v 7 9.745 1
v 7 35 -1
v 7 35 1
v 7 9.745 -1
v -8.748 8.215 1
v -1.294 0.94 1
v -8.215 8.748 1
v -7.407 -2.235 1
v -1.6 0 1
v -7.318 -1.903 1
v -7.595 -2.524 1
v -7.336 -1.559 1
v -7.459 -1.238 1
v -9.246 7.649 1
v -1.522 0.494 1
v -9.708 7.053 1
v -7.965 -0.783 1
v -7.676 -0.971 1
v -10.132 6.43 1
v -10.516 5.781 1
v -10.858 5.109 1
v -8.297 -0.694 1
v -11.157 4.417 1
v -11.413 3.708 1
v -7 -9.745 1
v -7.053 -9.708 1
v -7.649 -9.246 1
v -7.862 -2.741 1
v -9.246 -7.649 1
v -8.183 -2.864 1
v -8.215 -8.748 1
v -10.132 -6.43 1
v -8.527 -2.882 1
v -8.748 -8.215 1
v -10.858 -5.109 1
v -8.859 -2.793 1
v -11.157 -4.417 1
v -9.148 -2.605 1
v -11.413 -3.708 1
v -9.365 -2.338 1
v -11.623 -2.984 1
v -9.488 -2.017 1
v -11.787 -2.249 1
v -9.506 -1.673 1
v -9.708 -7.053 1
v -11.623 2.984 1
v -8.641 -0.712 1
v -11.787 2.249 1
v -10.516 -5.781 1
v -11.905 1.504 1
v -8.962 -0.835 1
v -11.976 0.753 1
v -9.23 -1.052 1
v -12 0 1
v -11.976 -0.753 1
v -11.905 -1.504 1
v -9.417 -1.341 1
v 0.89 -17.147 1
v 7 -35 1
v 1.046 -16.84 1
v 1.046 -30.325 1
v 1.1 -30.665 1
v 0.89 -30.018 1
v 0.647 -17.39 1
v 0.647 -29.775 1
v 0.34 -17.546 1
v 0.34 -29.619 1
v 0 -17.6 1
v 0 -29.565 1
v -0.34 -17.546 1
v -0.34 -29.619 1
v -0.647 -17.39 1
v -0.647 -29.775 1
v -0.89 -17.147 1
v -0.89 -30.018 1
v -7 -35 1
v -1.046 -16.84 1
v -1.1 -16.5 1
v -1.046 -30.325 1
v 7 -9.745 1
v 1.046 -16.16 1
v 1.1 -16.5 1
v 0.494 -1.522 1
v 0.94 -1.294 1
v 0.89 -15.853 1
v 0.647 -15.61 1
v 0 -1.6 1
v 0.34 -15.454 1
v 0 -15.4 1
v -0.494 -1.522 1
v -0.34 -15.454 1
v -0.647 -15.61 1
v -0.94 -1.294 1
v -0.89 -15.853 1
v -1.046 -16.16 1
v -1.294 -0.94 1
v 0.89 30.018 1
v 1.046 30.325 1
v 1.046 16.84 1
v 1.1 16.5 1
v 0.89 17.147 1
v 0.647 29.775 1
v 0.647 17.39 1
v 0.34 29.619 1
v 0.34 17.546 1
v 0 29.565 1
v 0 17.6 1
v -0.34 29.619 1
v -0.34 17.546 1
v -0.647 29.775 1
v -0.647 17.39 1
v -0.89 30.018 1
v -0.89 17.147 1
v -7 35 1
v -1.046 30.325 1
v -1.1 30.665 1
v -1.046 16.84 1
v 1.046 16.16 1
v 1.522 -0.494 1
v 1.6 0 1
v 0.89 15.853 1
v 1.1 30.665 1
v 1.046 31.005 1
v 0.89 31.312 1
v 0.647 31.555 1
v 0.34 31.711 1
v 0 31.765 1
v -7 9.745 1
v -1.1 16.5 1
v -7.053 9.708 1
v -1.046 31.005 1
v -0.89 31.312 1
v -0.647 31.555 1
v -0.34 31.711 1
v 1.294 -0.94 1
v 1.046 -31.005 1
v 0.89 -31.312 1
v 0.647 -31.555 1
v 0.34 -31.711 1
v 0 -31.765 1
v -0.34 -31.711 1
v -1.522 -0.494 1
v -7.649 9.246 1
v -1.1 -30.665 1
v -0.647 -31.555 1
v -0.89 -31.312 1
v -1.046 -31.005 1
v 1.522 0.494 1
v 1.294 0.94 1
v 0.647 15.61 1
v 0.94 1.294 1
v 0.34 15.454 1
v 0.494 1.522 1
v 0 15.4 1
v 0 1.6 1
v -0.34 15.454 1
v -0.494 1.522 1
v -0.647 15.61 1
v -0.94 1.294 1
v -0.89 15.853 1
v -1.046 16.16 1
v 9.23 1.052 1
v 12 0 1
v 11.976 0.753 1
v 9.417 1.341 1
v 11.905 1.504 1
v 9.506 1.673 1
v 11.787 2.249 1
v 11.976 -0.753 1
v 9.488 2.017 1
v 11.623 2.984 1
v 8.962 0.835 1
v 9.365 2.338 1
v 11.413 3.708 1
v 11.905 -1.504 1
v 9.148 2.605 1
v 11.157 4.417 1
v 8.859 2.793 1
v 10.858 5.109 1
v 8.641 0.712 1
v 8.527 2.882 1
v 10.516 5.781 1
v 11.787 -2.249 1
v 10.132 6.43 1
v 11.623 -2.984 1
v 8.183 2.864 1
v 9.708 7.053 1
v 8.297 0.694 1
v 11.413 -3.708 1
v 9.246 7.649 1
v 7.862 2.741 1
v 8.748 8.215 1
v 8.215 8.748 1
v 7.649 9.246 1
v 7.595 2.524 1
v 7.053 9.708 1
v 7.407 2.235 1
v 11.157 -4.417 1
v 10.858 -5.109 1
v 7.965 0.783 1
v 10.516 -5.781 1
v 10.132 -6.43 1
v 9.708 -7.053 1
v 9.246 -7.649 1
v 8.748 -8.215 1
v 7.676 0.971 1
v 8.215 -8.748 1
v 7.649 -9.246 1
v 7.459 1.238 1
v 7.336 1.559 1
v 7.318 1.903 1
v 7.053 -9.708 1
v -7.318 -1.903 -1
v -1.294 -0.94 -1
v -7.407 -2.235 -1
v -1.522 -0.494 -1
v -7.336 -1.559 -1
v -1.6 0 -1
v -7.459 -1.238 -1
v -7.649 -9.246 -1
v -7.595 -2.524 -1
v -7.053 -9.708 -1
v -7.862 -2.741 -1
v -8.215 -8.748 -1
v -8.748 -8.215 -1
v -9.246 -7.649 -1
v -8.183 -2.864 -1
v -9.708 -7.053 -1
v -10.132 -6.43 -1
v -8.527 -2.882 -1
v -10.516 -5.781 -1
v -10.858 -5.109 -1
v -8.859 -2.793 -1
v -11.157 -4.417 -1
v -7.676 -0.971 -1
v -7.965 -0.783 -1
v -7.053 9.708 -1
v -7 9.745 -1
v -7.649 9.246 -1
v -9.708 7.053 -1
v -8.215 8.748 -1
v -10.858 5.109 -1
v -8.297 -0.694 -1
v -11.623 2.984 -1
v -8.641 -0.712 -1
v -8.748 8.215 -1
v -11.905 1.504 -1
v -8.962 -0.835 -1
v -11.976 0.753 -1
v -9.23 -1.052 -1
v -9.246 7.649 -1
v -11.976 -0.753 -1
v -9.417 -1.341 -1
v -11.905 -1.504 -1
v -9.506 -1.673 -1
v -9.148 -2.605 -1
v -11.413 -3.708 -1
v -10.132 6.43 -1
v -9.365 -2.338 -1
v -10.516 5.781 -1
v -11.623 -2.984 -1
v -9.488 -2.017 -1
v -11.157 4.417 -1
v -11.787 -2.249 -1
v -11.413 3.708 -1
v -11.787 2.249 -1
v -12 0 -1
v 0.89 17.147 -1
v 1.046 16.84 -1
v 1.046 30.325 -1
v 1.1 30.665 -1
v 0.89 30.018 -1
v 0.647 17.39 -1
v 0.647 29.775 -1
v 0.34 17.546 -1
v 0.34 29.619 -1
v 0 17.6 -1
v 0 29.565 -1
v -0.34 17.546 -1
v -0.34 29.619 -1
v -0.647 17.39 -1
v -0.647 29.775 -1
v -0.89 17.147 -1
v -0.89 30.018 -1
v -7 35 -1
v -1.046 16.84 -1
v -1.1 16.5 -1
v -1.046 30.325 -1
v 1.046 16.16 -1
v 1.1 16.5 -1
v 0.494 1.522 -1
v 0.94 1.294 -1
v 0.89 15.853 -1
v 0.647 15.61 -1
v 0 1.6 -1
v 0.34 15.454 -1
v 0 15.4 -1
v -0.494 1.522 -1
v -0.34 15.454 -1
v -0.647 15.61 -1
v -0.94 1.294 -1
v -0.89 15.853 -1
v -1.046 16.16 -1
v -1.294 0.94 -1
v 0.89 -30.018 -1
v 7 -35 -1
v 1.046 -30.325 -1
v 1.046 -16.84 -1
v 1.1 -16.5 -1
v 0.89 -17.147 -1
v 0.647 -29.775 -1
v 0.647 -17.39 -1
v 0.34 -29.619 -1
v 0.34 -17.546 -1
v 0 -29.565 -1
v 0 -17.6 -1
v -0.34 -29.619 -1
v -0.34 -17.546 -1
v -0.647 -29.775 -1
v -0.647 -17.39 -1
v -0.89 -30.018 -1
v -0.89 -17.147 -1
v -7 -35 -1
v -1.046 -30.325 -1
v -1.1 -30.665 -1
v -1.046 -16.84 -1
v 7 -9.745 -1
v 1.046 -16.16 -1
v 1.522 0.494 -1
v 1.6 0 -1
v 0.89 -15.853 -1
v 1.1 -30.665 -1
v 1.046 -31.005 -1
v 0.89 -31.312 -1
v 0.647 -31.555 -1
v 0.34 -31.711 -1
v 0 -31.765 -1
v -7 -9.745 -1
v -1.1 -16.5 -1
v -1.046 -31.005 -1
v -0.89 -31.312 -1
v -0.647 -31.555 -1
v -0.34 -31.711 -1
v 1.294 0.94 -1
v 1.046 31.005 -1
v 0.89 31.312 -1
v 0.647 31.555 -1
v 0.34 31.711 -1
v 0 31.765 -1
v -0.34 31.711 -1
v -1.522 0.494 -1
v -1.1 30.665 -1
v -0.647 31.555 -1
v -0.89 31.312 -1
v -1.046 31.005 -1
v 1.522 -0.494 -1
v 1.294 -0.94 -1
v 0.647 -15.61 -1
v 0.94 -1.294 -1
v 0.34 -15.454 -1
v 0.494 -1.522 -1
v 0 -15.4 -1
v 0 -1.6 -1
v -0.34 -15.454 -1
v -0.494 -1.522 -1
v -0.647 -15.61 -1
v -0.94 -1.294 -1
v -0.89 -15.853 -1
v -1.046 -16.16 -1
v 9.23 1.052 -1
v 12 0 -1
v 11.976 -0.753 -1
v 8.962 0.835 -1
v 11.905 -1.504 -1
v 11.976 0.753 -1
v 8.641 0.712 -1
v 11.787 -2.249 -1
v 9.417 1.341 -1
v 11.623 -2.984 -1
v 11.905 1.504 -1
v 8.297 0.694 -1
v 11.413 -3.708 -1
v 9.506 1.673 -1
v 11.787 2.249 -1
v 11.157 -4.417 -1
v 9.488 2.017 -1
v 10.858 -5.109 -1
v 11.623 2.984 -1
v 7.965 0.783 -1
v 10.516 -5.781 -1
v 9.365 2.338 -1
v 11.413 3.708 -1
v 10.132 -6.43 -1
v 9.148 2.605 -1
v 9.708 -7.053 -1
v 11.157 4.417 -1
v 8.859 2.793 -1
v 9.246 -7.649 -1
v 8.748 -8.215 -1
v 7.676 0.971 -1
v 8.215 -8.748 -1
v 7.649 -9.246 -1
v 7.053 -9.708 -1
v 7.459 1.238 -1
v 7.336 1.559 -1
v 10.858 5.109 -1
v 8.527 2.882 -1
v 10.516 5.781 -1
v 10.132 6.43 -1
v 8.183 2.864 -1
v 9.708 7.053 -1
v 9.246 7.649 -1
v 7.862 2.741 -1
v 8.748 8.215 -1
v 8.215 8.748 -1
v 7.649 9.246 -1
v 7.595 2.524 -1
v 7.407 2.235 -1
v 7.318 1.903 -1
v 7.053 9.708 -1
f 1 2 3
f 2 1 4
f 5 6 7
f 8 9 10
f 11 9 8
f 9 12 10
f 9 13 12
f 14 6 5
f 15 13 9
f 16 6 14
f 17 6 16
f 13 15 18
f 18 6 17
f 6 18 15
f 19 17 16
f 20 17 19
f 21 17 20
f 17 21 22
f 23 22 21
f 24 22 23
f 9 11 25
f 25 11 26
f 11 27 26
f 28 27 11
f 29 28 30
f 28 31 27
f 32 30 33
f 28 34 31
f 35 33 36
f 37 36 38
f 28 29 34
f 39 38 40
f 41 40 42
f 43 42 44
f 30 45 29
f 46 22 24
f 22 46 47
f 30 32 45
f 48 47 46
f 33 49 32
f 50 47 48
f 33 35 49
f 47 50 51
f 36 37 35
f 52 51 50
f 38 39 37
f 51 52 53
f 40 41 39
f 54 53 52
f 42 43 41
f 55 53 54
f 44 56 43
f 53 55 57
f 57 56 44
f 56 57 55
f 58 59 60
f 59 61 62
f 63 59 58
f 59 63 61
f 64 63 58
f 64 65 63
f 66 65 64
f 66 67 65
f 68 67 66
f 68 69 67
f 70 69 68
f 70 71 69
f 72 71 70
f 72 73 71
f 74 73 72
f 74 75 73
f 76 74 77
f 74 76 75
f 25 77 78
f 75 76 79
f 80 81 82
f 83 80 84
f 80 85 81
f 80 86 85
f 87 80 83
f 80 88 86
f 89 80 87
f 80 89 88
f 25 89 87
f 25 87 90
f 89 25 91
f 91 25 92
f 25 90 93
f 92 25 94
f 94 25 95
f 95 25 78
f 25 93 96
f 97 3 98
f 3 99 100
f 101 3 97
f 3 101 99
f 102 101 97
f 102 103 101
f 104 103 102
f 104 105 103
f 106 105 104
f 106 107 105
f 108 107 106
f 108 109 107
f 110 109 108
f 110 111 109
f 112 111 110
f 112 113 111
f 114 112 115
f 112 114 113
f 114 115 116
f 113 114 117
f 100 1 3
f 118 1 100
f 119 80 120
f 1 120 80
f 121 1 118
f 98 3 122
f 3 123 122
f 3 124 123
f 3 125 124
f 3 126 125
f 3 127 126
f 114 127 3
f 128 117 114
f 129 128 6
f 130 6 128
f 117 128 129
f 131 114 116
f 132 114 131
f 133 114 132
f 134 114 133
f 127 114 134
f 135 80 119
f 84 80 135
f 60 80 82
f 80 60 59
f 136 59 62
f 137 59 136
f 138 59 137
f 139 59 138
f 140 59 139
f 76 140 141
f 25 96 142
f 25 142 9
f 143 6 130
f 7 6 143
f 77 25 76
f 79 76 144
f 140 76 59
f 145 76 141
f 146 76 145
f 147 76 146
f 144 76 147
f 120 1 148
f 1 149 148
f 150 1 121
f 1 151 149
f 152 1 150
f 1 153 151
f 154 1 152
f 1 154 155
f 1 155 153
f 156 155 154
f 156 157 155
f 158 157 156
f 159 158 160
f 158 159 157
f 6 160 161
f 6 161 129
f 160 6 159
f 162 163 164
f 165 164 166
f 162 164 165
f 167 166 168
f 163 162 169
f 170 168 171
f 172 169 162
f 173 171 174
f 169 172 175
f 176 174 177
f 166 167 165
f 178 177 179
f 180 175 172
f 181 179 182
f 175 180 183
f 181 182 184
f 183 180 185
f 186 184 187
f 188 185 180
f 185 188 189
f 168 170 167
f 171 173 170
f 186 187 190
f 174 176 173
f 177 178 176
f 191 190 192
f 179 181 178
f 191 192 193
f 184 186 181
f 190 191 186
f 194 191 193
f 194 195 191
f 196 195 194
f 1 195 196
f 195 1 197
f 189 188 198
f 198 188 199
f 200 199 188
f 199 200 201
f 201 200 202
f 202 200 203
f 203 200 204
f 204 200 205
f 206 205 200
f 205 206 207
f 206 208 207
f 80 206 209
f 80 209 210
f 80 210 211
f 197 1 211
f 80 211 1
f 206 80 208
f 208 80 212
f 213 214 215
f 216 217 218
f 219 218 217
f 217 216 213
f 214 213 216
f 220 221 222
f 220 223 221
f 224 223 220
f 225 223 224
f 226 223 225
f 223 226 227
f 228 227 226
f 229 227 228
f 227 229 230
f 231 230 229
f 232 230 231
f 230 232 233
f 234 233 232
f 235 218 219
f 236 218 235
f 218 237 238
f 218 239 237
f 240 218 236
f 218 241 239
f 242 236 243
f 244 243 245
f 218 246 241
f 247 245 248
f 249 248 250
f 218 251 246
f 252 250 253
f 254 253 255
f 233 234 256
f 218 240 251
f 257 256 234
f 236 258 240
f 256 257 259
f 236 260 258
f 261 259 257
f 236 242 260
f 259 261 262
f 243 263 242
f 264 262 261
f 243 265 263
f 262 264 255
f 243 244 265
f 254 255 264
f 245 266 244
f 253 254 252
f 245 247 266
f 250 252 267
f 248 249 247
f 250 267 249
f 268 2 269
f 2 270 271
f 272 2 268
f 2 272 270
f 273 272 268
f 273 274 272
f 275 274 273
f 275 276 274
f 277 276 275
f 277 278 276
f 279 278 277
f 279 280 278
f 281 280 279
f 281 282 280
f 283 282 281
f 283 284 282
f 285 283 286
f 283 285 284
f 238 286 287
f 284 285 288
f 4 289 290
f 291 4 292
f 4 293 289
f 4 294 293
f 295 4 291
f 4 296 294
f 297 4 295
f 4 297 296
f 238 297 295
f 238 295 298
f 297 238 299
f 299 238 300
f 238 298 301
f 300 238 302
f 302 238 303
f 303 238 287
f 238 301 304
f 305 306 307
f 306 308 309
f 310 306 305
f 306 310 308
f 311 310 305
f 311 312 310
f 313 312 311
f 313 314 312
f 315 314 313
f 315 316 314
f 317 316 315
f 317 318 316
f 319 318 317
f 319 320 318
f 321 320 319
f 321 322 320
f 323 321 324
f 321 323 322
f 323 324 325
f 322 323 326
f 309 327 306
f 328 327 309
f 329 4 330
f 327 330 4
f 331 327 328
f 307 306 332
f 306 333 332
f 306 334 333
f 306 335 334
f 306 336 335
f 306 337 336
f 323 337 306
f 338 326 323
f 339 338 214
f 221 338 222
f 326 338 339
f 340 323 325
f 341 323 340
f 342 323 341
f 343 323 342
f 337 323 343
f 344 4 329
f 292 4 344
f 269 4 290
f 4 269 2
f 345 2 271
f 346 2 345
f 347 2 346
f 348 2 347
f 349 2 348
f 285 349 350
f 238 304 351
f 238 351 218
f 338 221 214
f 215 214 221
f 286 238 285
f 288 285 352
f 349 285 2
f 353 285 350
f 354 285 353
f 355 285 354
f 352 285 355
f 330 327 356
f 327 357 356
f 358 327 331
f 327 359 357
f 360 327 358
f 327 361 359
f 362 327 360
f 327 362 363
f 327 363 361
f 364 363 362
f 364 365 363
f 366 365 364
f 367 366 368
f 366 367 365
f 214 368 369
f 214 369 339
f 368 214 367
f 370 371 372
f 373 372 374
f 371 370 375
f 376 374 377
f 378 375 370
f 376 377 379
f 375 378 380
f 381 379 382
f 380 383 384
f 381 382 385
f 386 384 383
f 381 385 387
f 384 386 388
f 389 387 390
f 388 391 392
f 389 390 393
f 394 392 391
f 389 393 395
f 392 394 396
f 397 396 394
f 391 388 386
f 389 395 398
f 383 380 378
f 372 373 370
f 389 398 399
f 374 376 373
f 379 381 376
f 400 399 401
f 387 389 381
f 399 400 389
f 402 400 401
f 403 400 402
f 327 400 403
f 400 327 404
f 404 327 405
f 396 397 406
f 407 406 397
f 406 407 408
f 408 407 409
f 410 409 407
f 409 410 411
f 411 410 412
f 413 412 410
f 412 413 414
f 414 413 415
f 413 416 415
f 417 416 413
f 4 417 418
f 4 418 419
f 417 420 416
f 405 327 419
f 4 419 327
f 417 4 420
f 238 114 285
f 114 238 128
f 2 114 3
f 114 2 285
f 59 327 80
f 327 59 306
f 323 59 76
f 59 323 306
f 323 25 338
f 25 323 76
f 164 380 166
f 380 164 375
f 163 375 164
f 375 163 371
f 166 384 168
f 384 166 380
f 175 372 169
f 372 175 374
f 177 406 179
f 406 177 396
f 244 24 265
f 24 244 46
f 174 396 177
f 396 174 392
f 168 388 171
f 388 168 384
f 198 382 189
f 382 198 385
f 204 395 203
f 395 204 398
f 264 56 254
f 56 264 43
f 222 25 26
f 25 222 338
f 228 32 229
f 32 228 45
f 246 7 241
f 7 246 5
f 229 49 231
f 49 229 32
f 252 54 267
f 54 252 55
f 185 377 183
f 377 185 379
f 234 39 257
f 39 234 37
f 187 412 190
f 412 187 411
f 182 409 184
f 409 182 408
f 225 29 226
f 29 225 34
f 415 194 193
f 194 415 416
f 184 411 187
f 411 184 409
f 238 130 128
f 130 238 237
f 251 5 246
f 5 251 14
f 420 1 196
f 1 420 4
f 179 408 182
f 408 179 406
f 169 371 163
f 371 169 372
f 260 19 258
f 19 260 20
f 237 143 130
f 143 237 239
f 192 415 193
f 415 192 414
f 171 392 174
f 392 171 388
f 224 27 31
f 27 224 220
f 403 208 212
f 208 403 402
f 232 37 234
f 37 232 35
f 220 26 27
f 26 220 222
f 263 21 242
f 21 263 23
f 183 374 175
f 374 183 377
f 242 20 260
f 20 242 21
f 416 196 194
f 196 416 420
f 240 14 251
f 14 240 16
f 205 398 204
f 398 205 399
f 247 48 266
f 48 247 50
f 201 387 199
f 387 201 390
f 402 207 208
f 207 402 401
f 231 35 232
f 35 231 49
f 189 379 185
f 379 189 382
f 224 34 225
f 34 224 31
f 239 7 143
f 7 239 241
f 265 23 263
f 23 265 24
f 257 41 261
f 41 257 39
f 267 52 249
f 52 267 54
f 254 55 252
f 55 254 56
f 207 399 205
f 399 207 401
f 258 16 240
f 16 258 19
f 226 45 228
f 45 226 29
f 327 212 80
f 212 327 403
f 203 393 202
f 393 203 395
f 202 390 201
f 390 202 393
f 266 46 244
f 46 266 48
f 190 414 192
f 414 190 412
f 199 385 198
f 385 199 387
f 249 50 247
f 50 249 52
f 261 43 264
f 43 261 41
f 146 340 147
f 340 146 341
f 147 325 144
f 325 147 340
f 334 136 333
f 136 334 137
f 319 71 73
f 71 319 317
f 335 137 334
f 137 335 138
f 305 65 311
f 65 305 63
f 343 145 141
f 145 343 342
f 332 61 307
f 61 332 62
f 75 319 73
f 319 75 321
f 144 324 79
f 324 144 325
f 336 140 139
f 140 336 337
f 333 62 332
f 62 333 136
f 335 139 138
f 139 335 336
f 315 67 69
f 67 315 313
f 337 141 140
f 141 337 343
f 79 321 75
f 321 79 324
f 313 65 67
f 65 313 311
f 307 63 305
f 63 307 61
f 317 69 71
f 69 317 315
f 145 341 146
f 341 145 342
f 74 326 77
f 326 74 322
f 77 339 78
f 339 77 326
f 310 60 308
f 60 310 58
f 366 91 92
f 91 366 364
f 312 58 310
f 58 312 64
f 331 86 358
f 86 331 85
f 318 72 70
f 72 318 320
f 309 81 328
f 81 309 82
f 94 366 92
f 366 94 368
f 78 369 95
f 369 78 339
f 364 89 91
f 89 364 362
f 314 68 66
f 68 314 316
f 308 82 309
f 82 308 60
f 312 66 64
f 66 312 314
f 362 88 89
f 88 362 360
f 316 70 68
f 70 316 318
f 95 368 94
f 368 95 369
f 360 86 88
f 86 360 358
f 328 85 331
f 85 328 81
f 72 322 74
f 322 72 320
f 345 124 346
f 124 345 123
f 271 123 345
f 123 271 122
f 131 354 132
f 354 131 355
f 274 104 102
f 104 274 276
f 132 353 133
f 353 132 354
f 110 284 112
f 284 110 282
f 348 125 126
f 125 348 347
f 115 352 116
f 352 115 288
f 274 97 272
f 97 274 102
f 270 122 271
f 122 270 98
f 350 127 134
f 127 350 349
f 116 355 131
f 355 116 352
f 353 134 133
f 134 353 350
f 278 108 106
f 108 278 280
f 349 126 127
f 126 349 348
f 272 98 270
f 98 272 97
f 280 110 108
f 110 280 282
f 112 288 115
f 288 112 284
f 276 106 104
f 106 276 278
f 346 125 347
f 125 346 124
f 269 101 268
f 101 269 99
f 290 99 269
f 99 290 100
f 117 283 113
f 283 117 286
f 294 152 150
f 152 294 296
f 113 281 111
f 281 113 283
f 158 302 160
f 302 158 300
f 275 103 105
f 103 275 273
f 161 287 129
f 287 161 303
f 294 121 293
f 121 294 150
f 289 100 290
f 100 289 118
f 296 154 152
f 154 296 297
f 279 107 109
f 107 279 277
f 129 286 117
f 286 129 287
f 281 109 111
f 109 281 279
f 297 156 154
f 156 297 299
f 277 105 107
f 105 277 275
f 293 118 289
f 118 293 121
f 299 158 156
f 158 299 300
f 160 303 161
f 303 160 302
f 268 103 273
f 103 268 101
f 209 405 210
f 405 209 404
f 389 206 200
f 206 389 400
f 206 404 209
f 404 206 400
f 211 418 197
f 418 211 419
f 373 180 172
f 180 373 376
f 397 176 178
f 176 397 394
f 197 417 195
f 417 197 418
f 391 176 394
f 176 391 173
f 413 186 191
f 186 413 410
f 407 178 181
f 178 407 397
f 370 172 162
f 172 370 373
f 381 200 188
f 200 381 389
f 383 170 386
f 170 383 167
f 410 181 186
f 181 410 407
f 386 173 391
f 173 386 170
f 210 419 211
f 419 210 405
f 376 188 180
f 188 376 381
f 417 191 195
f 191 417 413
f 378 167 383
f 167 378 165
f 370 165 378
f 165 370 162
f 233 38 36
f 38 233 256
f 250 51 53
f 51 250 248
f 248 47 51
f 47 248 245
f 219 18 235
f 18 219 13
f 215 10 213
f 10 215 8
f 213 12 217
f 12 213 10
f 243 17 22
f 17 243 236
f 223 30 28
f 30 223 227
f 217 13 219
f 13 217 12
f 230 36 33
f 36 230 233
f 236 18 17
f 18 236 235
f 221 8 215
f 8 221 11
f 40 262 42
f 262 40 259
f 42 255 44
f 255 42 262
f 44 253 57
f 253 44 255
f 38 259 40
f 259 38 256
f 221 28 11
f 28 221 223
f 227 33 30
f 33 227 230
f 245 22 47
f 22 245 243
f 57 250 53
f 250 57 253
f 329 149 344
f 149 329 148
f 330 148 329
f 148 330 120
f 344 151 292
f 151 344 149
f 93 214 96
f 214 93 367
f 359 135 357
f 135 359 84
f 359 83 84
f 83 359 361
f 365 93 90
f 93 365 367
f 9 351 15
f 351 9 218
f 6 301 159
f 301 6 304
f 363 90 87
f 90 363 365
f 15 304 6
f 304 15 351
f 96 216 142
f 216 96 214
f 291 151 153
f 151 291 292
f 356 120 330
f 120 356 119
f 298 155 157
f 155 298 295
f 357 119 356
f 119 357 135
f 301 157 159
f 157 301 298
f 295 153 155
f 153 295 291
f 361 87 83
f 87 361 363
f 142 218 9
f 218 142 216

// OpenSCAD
// file: ../../parameters.scad
global_clearance = 0.5;


//Main tube diameter - hole [mm]
main_tube_outer_diameter = 25.4;
main_tube_inner_diameter = 23.05;

// Nastavení parametrů rotoru

gliding_aggle = 14;         // tenhle úhel by se zřejmě v budoucnu měl počítat z požadované klouzavosti.

rotor_blade_AOA = 1.5;      // nastavení úhlu náběhu rotorového listu
rotor_blade_length = 970;   // délka rotorového listu
rotor_blade_depth = 50;     // hloubka rotorového listu
rotor_height = 180;         // výška otočného kloubu rotoru nad hlavní trubkou vírníku (odhad)
rotor_blades_count = 2;
rotor_delta_angle = 12;


rotor_head_width =  21.4;    //Rozměr 1 v nákresu
pilon_wall_thickness = 4.2;  // Rozměr 2 v nákresu
horizontal_screw_distance = 14.5;   // Rozměr 4 v nákresu
vertical_screw_distance = 12;       // rozměr 5 v nkresu

rotorhead_wall_thickness = 2; // sila tistenych dilu


bearing_outer_diameter = 7.1;    // Rozměr B1 v nákresu s přídavkem na toleranci otvoru
bearing_thickness = 3.1;        // Rozměr B2 v nákresu
bearing_shaft_length = 19.5;    // Rozměr B3 v nákresu


// nastavení parametrů motoru

engine_angle = -8;
engine_diameter = 55;
engine_offset = 55;

engine_screws_radius = 15;
engine_holes_radius = (24 + 44)/4;
engine_shatf_hole_diameter = 13;

// screw length step - minimum difference in length between two types of screws
basic_screw_length = 5;

//Screw diameter and nut for M5 [mm]
M5_screw_diameter=5.5;
M5_head_height = 5;
M5_head_diameter = 13+0.5;
M5_nut_height = 4.5;
M5_nut_diameter = 9.4;
M5_nut_pocket = 8.4;

//Screw diameter and nut for M4 [mm]
M4_screw_diameter=4.5;
M4_screw_head_height = 4;
M4_nut_height = 3.2;
M4_nut_diameter = 8.4;
M4_nut_pocket = 7.5;

//Screw diameter and nut for M3 [mm]
M3_screw_diameter = 3.2;
M3_nut_height = 2.7;
M3_nut_diameter = 6.6;
M3_screw_head_height = 3;
M3_nut_pocket = 5.6;


//Screw diameter and nut for M2,5 [mm]
M2_5_screw_diameter = 2.7;
M2_5_nut_height = 2.3;
M2_5_nut_diameter = 6;
M2_5_nut_pocket = 5.1;

//Screw diameter and nut for M2 [mm]
M2_screw_diameter = 2.2;
M2_nut_height = 1.8;
M2_nut_diameter = 4.5;
M2_nut_pocket = 3.95;



//šroub servo
Servo_screw = 1.5;
Servo_nut_height = 1;
Servo_nut_diameter = 2.7;



//center_of_gravity_position = [main_pilon_position - tan(gliding_aggle)*rotor_height, 0, 0];


////podzvozek

radius_undercarriage = 25;
vzdalenost_x = tan(20) * 131;
vzdalenost_y = (131 - radius_undercarriage)/tan(79);
uhel_y = 90 - 20;
uhel_x = 90 - 79;

maximum_printable_size = 150;


////Pitotova trubice
Pitot_tube_diameter = 4.02 + 1;
Distance_hole_from_tube = 11.92;  //vzdálenost otvoru pro připevnění od samotné trubičky
// file: ../888_1001.scad
//
//
//

include <../parameters.scad>

module 888_1001()
{
    angle_between_blades = 360 / rotor_blades_count;
    rotor_center_plate_size = 30;
    rotor_mounting_plate_size = 20;
    shaft_diameter = M3_screw_diameter;
    thickness = 2;
    blade_screws_distance = (16.47+11.86)/2;

    difference () {
        union () {
            cylinder(r = 3+9, h = thickness, center = true, $fn = 100);

            for (i = [0:rotor_blades_count]){
                rotate([0,0, i*angle_between_blades])
                    translate([0, 20, 0])
                        cube([14, 30, thickness], center = true);
            }
        }

        cylinder(d = shaft_diameter, h = 2* thickness, center = true, $fn = 20);


        for (i = [1:rotor_blades_count]){
            rotate([0,0, i*angle_between_blades])
                translate([0, 16.5 + blade_screws_distance/2, 0]) {
                    translate([0, blade_screws_distance/2, 0])
                        cylinder(d = M2_screw_diameter, h = 2* thickness, center = true, $fn = 20);
                    translate([0, -blade_screws_distance/2, 0])
                        cylinder(d = M2_screw_diameter, h = 2* thickness, center = true, $fn = 20);
                }
        }

        rotate([0,0, rotor_delta_angle])
        for (i = [1:rotor_blades_count]){
            rotate([0,0, i*angle_between_blades + angle_between_blades/2])
                translate([0, 3 + 4.5 + M2_screw_diameter/2, 0])
                    cylinder(d = M2_screw_diameter, h = 2* thickness, center = true, $fn = 20);
        }
    }
}

888_1001();
// main file
//
//
//

use <../888_1001.scad>

888_1001(hole_diameter=4);
